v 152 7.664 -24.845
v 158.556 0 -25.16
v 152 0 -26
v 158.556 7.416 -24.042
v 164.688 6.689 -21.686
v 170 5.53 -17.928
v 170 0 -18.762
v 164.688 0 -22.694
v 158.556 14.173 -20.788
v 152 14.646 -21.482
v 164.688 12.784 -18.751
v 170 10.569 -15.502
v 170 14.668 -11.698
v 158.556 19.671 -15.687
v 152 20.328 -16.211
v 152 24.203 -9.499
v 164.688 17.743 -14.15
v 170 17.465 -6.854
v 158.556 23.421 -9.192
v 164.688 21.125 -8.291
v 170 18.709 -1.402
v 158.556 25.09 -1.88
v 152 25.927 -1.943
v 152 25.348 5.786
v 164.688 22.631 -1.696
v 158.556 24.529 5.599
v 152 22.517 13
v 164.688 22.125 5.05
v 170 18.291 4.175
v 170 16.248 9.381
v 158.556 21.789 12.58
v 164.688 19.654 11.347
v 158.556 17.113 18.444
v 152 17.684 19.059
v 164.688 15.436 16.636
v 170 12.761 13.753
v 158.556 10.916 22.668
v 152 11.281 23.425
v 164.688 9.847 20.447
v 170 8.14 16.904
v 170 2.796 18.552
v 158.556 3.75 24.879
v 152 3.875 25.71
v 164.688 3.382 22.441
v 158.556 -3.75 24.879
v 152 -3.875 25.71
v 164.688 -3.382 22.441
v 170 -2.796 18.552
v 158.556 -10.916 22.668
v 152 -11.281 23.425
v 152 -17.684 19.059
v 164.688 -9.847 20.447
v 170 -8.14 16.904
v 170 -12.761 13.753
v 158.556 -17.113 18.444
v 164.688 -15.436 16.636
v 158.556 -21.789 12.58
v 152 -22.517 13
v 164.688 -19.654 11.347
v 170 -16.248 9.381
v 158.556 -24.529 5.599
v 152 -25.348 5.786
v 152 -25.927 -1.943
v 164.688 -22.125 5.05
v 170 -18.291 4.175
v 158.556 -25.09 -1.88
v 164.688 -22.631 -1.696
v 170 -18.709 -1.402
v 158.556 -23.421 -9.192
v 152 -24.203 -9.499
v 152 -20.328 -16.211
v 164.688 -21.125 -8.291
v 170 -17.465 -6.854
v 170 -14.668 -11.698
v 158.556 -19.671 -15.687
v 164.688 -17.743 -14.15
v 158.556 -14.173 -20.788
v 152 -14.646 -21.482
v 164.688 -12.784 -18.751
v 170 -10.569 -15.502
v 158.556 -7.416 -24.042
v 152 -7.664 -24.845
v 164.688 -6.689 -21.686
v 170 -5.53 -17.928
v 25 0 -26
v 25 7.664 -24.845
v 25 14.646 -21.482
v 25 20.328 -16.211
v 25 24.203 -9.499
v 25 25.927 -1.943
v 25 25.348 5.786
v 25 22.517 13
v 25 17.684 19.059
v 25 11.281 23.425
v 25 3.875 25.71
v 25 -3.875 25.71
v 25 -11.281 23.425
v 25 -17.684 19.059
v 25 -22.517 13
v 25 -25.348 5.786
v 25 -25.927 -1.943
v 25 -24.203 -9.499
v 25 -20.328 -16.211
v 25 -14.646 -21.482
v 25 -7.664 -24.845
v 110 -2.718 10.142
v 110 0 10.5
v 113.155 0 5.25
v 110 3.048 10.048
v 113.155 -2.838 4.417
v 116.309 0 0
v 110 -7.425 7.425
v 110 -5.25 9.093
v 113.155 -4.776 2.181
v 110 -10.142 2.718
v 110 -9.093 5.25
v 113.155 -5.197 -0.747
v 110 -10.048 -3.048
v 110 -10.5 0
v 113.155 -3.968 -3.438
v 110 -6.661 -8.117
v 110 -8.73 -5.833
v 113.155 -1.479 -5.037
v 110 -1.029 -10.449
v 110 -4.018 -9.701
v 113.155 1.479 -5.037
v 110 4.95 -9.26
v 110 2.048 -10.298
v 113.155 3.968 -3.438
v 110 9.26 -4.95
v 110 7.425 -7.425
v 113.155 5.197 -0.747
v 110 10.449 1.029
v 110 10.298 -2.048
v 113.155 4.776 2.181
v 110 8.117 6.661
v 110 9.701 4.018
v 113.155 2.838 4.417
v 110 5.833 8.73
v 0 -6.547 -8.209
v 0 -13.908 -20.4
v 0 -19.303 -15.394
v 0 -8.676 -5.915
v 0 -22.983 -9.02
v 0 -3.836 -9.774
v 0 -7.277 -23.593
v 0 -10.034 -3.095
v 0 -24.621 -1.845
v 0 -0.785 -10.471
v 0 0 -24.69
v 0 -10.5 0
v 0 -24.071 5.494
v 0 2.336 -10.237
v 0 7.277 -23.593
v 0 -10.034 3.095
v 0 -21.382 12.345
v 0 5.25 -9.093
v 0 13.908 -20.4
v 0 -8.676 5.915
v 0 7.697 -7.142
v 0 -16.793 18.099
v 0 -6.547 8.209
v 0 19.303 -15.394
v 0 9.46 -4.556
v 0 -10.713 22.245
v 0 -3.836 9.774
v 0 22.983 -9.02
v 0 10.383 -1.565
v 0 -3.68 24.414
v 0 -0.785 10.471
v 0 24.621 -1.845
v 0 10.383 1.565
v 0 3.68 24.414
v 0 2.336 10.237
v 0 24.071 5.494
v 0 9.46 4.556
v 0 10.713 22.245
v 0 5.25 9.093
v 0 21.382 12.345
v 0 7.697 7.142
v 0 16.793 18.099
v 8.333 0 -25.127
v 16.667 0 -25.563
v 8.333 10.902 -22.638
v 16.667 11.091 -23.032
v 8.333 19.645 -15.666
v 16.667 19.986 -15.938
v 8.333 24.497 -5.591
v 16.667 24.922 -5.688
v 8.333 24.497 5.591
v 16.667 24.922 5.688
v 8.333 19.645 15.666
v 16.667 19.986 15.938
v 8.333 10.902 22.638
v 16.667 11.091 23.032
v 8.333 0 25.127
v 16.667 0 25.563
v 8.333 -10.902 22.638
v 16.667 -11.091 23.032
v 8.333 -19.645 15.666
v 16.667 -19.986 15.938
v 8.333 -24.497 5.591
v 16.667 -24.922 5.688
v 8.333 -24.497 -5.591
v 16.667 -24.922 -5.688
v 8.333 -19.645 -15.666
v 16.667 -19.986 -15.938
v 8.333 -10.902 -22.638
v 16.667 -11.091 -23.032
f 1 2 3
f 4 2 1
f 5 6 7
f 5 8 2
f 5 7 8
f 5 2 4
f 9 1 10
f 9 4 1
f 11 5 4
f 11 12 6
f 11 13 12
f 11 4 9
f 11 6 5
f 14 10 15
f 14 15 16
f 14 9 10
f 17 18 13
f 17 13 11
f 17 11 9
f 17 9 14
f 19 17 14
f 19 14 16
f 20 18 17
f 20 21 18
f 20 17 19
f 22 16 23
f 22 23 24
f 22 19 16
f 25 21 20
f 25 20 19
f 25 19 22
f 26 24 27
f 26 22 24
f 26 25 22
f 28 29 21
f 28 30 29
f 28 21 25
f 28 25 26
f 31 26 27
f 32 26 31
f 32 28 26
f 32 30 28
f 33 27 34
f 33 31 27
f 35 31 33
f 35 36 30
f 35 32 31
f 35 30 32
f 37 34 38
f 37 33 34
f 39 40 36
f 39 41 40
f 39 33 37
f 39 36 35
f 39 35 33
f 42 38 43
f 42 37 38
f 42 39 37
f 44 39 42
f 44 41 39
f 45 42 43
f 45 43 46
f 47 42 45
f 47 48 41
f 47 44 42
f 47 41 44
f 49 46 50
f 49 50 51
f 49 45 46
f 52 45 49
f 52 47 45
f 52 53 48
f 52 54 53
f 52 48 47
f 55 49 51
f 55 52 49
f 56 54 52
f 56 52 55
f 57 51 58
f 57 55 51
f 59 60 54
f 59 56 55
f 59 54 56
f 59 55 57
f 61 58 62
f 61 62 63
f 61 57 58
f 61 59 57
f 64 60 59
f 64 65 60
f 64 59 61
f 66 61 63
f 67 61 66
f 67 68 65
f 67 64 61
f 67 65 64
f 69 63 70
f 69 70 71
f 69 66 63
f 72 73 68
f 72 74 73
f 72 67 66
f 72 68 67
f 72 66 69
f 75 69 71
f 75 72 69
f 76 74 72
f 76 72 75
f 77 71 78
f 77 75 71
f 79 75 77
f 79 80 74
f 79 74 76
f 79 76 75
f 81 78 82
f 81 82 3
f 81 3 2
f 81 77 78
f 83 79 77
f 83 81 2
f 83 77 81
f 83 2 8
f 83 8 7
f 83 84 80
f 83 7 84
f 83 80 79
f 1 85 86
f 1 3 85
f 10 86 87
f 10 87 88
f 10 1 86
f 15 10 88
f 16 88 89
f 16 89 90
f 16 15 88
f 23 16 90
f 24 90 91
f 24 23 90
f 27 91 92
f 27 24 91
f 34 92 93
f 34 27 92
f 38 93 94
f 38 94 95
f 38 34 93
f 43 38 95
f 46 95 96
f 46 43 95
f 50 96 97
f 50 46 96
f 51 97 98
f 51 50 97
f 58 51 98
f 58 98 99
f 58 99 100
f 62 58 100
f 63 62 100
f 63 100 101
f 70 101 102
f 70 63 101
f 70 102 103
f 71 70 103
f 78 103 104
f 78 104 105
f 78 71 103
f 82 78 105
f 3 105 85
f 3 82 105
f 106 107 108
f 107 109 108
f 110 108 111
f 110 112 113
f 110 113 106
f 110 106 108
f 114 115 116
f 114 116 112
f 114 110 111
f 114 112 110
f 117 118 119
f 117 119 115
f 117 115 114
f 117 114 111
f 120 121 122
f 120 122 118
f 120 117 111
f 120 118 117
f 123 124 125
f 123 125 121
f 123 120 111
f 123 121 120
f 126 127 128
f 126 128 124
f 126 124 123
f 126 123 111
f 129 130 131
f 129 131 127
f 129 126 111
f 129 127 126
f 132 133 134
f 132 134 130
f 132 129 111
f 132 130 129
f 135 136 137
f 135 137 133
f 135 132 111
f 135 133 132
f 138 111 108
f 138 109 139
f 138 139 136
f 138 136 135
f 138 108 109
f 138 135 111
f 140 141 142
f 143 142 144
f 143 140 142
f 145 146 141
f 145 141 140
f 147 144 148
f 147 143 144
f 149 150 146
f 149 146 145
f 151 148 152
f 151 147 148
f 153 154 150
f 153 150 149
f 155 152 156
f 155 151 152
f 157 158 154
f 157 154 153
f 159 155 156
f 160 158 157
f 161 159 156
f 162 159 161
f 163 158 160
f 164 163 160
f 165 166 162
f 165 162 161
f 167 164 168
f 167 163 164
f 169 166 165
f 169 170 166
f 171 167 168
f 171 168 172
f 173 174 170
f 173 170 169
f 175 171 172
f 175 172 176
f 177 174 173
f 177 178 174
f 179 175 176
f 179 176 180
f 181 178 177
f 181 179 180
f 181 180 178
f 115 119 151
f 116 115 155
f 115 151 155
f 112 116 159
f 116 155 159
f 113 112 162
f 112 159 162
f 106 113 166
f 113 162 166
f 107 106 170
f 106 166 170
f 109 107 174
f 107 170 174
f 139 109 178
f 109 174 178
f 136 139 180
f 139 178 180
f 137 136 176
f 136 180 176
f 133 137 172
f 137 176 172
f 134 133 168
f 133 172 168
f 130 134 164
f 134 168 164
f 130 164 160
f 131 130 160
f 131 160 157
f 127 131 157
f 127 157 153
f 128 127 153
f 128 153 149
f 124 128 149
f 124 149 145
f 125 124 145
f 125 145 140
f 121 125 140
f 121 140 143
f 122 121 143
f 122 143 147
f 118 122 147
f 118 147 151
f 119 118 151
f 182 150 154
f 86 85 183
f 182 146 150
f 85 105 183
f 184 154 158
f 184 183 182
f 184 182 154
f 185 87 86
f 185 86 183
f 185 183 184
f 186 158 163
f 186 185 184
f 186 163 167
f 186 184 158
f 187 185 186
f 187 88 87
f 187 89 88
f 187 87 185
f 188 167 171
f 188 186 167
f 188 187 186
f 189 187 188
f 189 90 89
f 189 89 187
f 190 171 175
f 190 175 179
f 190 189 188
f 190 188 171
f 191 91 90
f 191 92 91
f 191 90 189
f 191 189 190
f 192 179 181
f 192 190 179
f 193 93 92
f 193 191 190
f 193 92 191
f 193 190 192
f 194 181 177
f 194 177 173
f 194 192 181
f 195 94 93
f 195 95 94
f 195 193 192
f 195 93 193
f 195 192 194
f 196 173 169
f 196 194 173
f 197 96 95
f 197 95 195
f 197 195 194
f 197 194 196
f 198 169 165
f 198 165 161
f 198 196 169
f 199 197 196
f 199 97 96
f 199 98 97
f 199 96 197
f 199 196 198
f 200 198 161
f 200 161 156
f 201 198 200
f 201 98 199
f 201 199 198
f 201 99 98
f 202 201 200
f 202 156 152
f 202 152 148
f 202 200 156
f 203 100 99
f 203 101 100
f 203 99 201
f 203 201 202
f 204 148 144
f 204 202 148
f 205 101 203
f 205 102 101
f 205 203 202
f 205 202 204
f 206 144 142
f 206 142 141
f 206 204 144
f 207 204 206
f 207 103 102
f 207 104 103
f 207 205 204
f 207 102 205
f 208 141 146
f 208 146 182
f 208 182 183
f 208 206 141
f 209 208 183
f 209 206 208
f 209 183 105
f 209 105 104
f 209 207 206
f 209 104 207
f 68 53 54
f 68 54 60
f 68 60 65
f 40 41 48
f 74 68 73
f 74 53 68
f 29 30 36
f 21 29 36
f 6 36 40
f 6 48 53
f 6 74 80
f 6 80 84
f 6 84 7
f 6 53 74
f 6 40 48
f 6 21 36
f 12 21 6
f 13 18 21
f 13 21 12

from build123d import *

# Parameters (mm, degrees)
F2_R     = 10.5
F3_DEPTH = 110


with BuildPart() as f1:
    # F0 (on Front) → F1 (revolve)
    with BuildSketch(Plane.XZ):
        with BuildLine():
            Line((170, 0), (0, 0))
            Line((0, 0), (0, -24.689806))
            Line((0, -24.689806), (25, -26))
            Line((25, -26), (152, -26))
            ThreePointArc((152, -26), (161.700432, -24.122637), (170, -18.761663))
            Line((170, -18.761663), (170, 0))
        make_face()
    revolve(axis=Axis((85, 0, 0), (1, 0, 0)))

    # F2 (on face) → F3 (cut)
    with BuildSketch(Plane(origin=(0, 0, 0), x_dir=(0, -1, 0), z_dir=(-1, 0, 0))):
        Circle(F2_R)
    extrude(amount=-F3_DEPTH, mode=Mode.SUBTRACT)

    # F4 (on Front) → F5 (revolve, cut)
    with BuildSketch(Plane.XZ):
        Polygon((110, 0), (116.309036, 0), (110, 10.5), align=None)
    revolve(axis=Axis((113.154518, 0, 0), (1, 0, 0)), mode=Mode.SUBTRACT)


solid = f1.part
